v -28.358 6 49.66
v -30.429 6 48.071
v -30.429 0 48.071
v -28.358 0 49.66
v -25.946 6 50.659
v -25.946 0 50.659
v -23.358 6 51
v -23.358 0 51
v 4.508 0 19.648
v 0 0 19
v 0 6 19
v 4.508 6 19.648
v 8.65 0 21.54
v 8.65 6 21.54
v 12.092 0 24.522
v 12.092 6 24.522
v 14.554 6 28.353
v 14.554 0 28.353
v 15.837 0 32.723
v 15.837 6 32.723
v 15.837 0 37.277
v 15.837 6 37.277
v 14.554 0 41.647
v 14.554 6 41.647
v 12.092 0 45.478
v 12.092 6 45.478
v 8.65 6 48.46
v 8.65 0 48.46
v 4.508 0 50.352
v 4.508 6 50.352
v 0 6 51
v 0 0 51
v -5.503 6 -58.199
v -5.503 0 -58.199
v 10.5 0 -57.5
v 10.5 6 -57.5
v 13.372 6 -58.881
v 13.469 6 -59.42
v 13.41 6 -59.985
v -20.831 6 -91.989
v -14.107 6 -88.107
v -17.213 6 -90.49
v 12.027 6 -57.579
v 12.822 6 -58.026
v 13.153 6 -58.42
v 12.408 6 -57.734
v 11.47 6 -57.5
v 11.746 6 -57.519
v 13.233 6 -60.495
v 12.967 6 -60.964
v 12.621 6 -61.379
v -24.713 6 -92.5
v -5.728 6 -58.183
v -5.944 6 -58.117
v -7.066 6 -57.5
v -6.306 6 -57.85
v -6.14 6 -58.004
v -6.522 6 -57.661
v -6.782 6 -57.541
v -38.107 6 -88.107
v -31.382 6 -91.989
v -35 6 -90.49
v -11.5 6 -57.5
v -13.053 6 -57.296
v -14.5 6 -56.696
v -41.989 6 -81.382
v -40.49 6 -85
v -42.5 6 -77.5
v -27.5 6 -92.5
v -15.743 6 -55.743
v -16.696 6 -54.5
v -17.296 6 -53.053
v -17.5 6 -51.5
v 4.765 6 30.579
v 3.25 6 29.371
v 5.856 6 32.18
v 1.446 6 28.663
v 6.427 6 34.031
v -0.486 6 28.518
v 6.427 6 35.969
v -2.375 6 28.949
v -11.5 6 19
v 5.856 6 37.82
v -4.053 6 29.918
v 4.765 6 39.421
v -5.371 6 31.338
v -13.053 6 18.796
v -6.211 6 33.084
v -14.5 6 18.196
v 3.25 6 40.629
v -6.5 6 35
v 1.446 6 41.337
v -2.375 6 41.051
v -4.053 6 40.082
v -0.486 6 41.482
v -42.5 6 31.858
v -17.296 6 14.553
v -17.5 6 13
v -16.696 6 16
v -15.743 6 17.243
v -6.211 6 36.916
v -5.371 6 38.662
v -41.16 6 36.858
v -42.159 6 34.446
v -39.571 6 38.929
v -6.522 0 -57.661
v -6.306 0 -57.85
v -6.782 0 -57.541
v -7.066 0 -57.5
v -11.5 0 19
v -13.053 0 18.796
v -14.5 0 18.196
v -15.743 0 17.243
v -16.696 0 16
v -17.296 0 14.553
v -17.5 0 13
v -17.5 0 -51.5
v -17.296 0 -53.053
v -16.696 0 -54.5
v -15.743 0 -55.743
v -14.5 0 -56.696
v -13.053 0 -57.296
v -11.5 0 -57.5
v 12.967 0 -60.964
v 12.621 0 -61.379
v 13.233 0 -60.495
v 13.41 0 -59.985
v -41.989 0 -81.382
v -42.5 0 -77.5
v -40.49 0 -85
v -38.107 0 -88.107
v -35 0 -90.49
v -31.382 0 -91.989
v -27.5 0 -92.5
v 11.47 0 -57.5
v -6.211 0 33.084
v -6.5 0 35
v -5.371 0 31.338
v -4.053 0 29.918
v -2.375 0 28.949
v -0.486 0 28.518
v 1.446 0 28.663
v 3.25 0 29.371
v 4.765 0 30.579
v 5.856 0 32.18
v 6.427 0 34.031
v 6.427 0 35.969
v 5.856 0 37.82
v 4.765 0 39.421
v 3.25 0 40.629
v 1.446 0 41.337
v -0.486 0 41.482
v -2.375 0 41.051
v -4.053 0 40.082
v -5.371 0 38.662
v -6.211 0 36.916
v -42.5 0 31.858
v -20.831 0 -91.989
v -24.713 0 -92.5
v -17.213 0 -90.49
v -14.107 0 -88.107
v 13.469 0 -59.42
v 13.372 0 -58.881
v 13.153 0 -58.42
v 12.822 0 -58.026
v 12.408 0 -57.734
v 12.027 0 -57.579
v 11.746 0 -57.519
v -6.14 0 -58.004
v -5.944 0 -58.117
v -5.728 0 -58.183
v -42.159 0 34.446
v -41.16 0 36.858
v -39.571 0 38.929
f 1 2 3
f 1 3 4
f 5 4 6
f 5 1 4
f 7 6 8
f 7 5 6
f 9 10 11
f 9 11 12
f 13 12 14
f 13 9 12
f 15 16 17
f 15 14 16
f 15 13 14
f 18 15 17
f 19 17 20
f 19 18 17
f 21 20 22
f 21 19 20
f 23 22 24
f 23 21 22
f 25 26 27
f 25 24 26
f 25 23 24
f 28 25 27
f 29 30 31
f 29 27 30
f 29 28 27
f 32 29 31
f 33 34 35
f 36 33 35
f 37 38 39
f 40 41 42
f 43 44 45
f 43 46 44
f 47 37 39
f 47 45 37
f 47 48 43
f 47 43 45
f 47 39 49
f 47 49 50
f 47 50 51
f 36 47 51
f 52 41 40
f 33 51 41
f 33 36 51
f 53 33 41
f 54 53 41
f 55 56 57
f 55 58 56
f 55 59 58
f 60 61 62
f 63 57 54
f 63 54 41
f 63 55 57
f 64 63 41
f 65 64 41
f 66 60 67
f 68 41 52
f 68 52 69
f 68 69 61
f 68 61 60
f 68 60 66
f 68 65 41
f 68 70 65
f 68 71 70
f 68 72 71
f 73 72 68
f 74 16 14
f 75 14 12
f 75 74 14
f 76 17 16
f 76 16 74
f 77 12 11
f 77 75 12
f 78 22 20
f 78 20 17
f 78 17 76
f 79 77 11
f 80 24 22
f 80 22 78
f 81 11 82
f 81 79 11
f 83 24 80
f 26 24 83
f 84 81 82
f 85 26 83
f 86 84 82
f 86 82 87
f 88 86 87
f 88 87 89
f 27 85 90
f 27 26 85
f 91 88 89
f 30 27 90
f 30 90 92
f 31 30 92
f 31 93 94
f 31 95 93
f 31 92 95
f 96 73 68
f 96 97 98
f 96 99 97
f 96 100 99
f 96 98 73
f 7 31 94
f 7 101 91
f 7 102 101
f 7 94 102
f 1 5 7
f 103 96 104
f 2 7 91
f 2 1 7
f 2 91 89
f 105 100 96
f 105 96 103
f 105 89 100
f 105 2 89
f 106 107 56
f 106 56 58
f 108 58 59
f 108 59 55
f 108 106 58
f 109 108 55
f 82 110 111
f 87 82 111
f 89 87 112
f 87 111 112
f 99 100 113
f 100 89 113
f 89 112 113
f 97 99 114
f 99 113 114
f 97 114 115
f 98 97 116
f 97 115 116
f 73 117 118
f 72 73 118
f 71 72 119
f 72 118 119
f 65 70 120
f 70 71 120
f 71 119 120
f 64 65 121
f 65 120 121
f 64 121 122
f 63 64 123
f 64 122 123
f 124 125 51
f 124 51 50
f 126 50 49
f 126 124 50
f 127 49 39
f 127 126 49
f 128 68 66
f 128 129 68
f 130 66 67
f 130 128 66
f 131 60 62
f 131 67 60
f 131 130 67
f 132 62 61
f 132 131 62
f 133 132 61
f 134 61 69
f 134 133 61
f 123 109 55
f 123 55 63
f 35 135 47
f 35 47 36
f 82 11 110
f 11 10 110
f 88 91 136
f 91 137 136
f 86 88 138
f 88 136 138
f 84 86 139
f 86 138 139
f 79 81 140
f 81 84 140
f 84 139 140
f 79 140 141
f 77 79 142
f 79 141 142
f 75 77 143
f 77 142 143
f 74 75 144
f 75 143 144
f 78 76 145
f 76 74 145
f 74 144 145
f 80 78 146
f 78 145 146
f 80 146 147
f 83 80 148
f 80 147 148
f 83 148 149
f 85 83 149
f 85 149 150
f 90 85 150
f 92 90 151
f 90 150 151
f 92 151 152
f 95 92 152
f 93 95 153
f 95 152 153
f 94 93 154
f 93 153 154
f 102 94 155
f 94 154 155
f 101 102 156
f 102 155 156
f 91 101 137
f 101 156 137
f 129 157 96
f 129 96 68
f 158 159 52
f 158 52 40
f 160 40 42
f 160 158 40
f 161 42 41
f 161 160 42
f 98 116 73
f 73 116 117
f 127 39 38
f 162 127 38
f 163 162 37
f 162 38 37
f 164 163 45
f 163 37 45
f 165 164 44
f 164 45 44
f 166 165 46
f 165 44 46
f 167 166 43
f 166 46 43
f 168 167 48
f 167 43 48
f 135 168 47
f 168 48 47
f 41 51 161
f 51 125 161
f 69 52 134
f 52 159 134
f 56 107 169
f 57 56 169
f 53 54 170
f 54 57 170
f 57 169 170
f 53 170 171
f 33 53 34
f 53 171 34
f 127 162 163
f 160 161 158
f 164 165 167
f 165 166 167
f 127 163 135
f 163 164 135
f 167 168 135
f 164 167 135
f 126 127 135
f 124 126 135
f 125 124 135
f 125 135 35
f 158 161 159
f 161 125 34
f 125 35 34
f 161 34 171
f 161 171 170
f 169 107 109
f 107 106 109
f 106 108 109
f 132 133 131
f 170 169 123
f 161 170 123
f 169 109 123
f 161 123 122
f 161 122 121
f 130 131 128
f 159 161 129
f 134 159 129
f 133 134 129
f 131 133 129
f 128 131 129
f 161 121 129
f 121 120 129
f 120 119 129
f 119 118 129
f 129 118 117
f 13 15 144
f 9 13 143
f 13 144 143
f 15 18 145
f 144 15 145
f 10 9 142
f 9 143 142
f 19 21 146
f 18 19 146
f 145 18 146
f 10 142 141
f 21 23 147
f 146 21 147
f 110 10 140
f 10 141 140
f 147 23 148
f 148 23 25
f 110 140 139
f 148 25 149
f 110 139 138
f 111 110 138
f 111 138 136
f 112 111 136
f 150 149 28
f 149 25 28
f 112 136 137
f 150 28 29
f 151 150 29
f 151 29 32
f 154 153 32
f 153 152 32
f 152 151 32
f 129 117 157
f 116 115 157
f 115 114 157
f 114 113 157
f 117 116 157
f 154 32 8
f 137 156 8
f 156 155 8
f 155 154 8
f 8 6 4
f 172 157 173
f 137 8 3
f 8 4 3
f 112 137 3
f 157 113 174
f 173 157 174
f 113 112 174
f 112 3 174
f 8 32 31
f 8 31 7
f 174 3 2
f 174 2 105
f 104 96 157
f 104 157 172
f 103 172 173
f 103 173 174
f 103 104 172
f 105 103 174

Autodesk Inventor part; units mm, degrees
ref_plane "YZ Plane" through (0, 0, 0) normal (1, 0, 0) x (0, 1, 0)
ref_plane "XZ Plane" through (0, 0, 0) normal (0, 1, 0) x (-1, 0, 0)
ref_plane "XY Plane" through (0, 0, 0) normal (0, 0, 1) x (1, 0, 0)
sketch "Náčrt2" plane through (0, 0, 0) normal (0, 1, 0) x (-1, 0, 0)
  line L0 (11.5, 17.5) -> (-11.5, 17.5) construction
  line L1 (-17.5, 11.5) -> (-17.5, -11.5) construction
  line L2 (-11.5, -17.5) -> (11.5, -17.5) construction
  line L3 (17.5, -11.5) -> (17.5, 11.5) construction
  line L4 (42.5, 36) -> (42.5, -77.5)
  line L5 (9, -22.5) -> (-14, -22.5) construction
  line L6 (-20, -28.5) -> (-20, -51.5) construction
  line L7 (-14, -57.5) -> (9, -57.5) construction
  line L8 (15, -51.5) -> (15, -28.5) construction
  arc A0 (15, -28.5) -> (9, -22.5) centre (9, -28.5) ccw construction
  arc A1 (9, -57.5) -> (15, -51.5) centre (9, -51.5) ccw construction
  arc A2 (-20, -51.5) -> (-14, -57.5) centre (-14, -51.5) ccw construction
  arc A3 (-14, -22.5) -> (-20, -28.5) centre (-14, -28.5) ccw construction
  line L9 (-45.6938, -20) -> (9, -20) construction
  arc A4 (17.5, -28.5) -> (9, -20) centre (9, -28.5) ccw construction
  line L10 (17.5, -28.5) -> (17.5, -51.5) construction
  line L11 (17.5, -51.5) -> (15, -51.5) construction
  line L12 (-14, -22.5) -> (-45.6938, -22.5) construction
  line L13 (-45.6938, -22.5) -> (-45.6938, -20) construction
  arc A5 (17.5, 11.5) -> (11.5, 17.5) centre (11.5, 11.5) ccw construction
  arc A6 (11.5, -17.5) -> (17.5, -11.5) centre (11.5, -11.5) ccw construction
  arc A7 (-17.5, -11.5) -> (-11.5, -17.5) centre (-11.5, -11.5) ccw construction
  arc A8 (-11.5, 17.5) -> (-17.5, 11.5) centre (-11.5, 11.5) ccw construction
  line L14 (-11.5, -20) -> (11.5, -20) construction
  line L15 (-20, 73.4113) -> (-20, -11.5) construction
  arc A9 (-20, -11.5) -> (-11.5, -20) centre (-11.5, -11.5) ccw construction
  line L16 (-17.5, 11.5) -> (-17.5, 73.4113) construction
  line L17 (-17.5, 73.4113) -> (-20, 73.4113) construction
  line L18 (11.5, -20) -> (11.5, -17.5) construction
  line L19 (17.5, 17.5) -> (-17.5, 17.5) construction
  line L20 (-17.5, 17.5) -> (-17.5, 52.5) construction
  line L21 (-17.5, 52.5) -> (17.5, 52.5) construction
  line L22 (17.5, 52.5) -> (17.5, 17.5) construction
  circle A10 centre (0, 35) radius 6.5
  arc A11 (0, 51) -> (0, 19) centre (0, 35) ccw
  line L23 (0, 51) -> (27.5, 51)
  line L24 (0, 19) -> (11.5, 19)
  line L25 (27.5, 51) -> (42.5, 36)
  arc A12 (17.5, 13) -> (11.5, 19) centre (11.5, 13) ccw
  line L26 (17.5, 13) -> (17.5, -51.5)
  line L27 (-13.5, -57.5) -> (-13.5, -59.2574)
  line L28 (-12.6213, -61.3787) -> (14.1066, -88.1066)
  line L29 (24.7132, -92.5) -> (27.5, -92.5)
  arc A13 (27.5, -92.5) -> (42.5, -77.5) centre (27.5, -77.5) ccw
  arc A14 (14.1066, -88.1066) -> (24.7132, -92.5) centre (24.7132, -77.5) ccw
  arc A15 (-13.5, -59.2574) -> (-12.6213, -61.3787) centre (-10.5, -59.2574) ccw
  line L30 (17.5, -51.5) -> (17.5, -51.5)
  line L31 (6.4677, -58.2408) -> (-10.5, -57.5)
  line L32 (-13.5, -57.5) -> (-10.5, -57.5)
  line L33 (6.4677, -58.2408) -> (6.5, -57.5)
  line L34 (6.5, -57.5) -> (11.5, -57.5)
  arc A16 (11.5, -57.5) -> (17.5, -51.5) centre (11.5, -51.5) ccw
  point P0 (0, 0)
  point P1 (17.5, 0)
  point P2 (0, 17.5)
  point P3 (42.5, 51)
  point P4 (17.5, 35)
  point P5 (0, 52.5)
  point P6 (-13.5, -60.5)
  dimension "d34" = 35
  dimension "d35" = 6
  dimension "d36" = 5
  dimension "d37" = 2.5
  dimension "d38" = 2.5
  dimension "d39" = 6
  dimension "d40" = 2.5
  dimension "d43" = 25
  dimension "d46" = 13
  dimension "d47" = 32
  dimension "d48" = 15
  dimension "d49" = 15
  dimension "d50" = 6
  dimension "d51" = 35
  dimension "d55" = 3
  dimension "d56" = 15
  dimension "d57" = 15
  dimension "d58" = 3
  dimension "d60" = 35
  dimension "d61" = 3
  dimension "d62" = 2.5
  dimension "d63" = 35
  dimension "d64" = 45
  dimension "d66" = 31
  dimension "d69" = 6
  dimension "d72" = 2.5
extrude "Vysunutí1" add sketch "Náčrt2" along normal blind 6
fillet "Zaoblení3" radius 2 1 edges at (13.5, 3, -57.5)
fillet "Zaoblení4" radius 10 2 edges at (-27.5, 3, 51) (-42.5, 3, 36)
fillet "Zaoblení5" radius 1 2 edges at (-6.5, 3, -57.5) (-6.4677, 3, -58.2408)
equation "\"d49\" = d48"
equation "\"PoloměrOhybu\" = Tloušťka"
equation "\"ŠířkaVýštipu\" = Tloušťka"
equation "\"HloubkaVýštipu\" = 0.5 * Tloušťka"
equation "\"VelikostRohovéhoVýštipu\" = 4 * Tloušťka"
equation "\"MinimálníZbytek\" = 2 * Tloušťka"
equation "\"PřechodovýPoloměr\" = PoloměrOhybu"
equation "\"VelikostJacobihoPoloměru\" = PoloměrOhybu"
equation "\"VelikostMezery\" = Tloušťka"
equation "\"Tloušťka\" = 6"
properties part number "DD_KVD_002_07" material "Nerezová ocel"
